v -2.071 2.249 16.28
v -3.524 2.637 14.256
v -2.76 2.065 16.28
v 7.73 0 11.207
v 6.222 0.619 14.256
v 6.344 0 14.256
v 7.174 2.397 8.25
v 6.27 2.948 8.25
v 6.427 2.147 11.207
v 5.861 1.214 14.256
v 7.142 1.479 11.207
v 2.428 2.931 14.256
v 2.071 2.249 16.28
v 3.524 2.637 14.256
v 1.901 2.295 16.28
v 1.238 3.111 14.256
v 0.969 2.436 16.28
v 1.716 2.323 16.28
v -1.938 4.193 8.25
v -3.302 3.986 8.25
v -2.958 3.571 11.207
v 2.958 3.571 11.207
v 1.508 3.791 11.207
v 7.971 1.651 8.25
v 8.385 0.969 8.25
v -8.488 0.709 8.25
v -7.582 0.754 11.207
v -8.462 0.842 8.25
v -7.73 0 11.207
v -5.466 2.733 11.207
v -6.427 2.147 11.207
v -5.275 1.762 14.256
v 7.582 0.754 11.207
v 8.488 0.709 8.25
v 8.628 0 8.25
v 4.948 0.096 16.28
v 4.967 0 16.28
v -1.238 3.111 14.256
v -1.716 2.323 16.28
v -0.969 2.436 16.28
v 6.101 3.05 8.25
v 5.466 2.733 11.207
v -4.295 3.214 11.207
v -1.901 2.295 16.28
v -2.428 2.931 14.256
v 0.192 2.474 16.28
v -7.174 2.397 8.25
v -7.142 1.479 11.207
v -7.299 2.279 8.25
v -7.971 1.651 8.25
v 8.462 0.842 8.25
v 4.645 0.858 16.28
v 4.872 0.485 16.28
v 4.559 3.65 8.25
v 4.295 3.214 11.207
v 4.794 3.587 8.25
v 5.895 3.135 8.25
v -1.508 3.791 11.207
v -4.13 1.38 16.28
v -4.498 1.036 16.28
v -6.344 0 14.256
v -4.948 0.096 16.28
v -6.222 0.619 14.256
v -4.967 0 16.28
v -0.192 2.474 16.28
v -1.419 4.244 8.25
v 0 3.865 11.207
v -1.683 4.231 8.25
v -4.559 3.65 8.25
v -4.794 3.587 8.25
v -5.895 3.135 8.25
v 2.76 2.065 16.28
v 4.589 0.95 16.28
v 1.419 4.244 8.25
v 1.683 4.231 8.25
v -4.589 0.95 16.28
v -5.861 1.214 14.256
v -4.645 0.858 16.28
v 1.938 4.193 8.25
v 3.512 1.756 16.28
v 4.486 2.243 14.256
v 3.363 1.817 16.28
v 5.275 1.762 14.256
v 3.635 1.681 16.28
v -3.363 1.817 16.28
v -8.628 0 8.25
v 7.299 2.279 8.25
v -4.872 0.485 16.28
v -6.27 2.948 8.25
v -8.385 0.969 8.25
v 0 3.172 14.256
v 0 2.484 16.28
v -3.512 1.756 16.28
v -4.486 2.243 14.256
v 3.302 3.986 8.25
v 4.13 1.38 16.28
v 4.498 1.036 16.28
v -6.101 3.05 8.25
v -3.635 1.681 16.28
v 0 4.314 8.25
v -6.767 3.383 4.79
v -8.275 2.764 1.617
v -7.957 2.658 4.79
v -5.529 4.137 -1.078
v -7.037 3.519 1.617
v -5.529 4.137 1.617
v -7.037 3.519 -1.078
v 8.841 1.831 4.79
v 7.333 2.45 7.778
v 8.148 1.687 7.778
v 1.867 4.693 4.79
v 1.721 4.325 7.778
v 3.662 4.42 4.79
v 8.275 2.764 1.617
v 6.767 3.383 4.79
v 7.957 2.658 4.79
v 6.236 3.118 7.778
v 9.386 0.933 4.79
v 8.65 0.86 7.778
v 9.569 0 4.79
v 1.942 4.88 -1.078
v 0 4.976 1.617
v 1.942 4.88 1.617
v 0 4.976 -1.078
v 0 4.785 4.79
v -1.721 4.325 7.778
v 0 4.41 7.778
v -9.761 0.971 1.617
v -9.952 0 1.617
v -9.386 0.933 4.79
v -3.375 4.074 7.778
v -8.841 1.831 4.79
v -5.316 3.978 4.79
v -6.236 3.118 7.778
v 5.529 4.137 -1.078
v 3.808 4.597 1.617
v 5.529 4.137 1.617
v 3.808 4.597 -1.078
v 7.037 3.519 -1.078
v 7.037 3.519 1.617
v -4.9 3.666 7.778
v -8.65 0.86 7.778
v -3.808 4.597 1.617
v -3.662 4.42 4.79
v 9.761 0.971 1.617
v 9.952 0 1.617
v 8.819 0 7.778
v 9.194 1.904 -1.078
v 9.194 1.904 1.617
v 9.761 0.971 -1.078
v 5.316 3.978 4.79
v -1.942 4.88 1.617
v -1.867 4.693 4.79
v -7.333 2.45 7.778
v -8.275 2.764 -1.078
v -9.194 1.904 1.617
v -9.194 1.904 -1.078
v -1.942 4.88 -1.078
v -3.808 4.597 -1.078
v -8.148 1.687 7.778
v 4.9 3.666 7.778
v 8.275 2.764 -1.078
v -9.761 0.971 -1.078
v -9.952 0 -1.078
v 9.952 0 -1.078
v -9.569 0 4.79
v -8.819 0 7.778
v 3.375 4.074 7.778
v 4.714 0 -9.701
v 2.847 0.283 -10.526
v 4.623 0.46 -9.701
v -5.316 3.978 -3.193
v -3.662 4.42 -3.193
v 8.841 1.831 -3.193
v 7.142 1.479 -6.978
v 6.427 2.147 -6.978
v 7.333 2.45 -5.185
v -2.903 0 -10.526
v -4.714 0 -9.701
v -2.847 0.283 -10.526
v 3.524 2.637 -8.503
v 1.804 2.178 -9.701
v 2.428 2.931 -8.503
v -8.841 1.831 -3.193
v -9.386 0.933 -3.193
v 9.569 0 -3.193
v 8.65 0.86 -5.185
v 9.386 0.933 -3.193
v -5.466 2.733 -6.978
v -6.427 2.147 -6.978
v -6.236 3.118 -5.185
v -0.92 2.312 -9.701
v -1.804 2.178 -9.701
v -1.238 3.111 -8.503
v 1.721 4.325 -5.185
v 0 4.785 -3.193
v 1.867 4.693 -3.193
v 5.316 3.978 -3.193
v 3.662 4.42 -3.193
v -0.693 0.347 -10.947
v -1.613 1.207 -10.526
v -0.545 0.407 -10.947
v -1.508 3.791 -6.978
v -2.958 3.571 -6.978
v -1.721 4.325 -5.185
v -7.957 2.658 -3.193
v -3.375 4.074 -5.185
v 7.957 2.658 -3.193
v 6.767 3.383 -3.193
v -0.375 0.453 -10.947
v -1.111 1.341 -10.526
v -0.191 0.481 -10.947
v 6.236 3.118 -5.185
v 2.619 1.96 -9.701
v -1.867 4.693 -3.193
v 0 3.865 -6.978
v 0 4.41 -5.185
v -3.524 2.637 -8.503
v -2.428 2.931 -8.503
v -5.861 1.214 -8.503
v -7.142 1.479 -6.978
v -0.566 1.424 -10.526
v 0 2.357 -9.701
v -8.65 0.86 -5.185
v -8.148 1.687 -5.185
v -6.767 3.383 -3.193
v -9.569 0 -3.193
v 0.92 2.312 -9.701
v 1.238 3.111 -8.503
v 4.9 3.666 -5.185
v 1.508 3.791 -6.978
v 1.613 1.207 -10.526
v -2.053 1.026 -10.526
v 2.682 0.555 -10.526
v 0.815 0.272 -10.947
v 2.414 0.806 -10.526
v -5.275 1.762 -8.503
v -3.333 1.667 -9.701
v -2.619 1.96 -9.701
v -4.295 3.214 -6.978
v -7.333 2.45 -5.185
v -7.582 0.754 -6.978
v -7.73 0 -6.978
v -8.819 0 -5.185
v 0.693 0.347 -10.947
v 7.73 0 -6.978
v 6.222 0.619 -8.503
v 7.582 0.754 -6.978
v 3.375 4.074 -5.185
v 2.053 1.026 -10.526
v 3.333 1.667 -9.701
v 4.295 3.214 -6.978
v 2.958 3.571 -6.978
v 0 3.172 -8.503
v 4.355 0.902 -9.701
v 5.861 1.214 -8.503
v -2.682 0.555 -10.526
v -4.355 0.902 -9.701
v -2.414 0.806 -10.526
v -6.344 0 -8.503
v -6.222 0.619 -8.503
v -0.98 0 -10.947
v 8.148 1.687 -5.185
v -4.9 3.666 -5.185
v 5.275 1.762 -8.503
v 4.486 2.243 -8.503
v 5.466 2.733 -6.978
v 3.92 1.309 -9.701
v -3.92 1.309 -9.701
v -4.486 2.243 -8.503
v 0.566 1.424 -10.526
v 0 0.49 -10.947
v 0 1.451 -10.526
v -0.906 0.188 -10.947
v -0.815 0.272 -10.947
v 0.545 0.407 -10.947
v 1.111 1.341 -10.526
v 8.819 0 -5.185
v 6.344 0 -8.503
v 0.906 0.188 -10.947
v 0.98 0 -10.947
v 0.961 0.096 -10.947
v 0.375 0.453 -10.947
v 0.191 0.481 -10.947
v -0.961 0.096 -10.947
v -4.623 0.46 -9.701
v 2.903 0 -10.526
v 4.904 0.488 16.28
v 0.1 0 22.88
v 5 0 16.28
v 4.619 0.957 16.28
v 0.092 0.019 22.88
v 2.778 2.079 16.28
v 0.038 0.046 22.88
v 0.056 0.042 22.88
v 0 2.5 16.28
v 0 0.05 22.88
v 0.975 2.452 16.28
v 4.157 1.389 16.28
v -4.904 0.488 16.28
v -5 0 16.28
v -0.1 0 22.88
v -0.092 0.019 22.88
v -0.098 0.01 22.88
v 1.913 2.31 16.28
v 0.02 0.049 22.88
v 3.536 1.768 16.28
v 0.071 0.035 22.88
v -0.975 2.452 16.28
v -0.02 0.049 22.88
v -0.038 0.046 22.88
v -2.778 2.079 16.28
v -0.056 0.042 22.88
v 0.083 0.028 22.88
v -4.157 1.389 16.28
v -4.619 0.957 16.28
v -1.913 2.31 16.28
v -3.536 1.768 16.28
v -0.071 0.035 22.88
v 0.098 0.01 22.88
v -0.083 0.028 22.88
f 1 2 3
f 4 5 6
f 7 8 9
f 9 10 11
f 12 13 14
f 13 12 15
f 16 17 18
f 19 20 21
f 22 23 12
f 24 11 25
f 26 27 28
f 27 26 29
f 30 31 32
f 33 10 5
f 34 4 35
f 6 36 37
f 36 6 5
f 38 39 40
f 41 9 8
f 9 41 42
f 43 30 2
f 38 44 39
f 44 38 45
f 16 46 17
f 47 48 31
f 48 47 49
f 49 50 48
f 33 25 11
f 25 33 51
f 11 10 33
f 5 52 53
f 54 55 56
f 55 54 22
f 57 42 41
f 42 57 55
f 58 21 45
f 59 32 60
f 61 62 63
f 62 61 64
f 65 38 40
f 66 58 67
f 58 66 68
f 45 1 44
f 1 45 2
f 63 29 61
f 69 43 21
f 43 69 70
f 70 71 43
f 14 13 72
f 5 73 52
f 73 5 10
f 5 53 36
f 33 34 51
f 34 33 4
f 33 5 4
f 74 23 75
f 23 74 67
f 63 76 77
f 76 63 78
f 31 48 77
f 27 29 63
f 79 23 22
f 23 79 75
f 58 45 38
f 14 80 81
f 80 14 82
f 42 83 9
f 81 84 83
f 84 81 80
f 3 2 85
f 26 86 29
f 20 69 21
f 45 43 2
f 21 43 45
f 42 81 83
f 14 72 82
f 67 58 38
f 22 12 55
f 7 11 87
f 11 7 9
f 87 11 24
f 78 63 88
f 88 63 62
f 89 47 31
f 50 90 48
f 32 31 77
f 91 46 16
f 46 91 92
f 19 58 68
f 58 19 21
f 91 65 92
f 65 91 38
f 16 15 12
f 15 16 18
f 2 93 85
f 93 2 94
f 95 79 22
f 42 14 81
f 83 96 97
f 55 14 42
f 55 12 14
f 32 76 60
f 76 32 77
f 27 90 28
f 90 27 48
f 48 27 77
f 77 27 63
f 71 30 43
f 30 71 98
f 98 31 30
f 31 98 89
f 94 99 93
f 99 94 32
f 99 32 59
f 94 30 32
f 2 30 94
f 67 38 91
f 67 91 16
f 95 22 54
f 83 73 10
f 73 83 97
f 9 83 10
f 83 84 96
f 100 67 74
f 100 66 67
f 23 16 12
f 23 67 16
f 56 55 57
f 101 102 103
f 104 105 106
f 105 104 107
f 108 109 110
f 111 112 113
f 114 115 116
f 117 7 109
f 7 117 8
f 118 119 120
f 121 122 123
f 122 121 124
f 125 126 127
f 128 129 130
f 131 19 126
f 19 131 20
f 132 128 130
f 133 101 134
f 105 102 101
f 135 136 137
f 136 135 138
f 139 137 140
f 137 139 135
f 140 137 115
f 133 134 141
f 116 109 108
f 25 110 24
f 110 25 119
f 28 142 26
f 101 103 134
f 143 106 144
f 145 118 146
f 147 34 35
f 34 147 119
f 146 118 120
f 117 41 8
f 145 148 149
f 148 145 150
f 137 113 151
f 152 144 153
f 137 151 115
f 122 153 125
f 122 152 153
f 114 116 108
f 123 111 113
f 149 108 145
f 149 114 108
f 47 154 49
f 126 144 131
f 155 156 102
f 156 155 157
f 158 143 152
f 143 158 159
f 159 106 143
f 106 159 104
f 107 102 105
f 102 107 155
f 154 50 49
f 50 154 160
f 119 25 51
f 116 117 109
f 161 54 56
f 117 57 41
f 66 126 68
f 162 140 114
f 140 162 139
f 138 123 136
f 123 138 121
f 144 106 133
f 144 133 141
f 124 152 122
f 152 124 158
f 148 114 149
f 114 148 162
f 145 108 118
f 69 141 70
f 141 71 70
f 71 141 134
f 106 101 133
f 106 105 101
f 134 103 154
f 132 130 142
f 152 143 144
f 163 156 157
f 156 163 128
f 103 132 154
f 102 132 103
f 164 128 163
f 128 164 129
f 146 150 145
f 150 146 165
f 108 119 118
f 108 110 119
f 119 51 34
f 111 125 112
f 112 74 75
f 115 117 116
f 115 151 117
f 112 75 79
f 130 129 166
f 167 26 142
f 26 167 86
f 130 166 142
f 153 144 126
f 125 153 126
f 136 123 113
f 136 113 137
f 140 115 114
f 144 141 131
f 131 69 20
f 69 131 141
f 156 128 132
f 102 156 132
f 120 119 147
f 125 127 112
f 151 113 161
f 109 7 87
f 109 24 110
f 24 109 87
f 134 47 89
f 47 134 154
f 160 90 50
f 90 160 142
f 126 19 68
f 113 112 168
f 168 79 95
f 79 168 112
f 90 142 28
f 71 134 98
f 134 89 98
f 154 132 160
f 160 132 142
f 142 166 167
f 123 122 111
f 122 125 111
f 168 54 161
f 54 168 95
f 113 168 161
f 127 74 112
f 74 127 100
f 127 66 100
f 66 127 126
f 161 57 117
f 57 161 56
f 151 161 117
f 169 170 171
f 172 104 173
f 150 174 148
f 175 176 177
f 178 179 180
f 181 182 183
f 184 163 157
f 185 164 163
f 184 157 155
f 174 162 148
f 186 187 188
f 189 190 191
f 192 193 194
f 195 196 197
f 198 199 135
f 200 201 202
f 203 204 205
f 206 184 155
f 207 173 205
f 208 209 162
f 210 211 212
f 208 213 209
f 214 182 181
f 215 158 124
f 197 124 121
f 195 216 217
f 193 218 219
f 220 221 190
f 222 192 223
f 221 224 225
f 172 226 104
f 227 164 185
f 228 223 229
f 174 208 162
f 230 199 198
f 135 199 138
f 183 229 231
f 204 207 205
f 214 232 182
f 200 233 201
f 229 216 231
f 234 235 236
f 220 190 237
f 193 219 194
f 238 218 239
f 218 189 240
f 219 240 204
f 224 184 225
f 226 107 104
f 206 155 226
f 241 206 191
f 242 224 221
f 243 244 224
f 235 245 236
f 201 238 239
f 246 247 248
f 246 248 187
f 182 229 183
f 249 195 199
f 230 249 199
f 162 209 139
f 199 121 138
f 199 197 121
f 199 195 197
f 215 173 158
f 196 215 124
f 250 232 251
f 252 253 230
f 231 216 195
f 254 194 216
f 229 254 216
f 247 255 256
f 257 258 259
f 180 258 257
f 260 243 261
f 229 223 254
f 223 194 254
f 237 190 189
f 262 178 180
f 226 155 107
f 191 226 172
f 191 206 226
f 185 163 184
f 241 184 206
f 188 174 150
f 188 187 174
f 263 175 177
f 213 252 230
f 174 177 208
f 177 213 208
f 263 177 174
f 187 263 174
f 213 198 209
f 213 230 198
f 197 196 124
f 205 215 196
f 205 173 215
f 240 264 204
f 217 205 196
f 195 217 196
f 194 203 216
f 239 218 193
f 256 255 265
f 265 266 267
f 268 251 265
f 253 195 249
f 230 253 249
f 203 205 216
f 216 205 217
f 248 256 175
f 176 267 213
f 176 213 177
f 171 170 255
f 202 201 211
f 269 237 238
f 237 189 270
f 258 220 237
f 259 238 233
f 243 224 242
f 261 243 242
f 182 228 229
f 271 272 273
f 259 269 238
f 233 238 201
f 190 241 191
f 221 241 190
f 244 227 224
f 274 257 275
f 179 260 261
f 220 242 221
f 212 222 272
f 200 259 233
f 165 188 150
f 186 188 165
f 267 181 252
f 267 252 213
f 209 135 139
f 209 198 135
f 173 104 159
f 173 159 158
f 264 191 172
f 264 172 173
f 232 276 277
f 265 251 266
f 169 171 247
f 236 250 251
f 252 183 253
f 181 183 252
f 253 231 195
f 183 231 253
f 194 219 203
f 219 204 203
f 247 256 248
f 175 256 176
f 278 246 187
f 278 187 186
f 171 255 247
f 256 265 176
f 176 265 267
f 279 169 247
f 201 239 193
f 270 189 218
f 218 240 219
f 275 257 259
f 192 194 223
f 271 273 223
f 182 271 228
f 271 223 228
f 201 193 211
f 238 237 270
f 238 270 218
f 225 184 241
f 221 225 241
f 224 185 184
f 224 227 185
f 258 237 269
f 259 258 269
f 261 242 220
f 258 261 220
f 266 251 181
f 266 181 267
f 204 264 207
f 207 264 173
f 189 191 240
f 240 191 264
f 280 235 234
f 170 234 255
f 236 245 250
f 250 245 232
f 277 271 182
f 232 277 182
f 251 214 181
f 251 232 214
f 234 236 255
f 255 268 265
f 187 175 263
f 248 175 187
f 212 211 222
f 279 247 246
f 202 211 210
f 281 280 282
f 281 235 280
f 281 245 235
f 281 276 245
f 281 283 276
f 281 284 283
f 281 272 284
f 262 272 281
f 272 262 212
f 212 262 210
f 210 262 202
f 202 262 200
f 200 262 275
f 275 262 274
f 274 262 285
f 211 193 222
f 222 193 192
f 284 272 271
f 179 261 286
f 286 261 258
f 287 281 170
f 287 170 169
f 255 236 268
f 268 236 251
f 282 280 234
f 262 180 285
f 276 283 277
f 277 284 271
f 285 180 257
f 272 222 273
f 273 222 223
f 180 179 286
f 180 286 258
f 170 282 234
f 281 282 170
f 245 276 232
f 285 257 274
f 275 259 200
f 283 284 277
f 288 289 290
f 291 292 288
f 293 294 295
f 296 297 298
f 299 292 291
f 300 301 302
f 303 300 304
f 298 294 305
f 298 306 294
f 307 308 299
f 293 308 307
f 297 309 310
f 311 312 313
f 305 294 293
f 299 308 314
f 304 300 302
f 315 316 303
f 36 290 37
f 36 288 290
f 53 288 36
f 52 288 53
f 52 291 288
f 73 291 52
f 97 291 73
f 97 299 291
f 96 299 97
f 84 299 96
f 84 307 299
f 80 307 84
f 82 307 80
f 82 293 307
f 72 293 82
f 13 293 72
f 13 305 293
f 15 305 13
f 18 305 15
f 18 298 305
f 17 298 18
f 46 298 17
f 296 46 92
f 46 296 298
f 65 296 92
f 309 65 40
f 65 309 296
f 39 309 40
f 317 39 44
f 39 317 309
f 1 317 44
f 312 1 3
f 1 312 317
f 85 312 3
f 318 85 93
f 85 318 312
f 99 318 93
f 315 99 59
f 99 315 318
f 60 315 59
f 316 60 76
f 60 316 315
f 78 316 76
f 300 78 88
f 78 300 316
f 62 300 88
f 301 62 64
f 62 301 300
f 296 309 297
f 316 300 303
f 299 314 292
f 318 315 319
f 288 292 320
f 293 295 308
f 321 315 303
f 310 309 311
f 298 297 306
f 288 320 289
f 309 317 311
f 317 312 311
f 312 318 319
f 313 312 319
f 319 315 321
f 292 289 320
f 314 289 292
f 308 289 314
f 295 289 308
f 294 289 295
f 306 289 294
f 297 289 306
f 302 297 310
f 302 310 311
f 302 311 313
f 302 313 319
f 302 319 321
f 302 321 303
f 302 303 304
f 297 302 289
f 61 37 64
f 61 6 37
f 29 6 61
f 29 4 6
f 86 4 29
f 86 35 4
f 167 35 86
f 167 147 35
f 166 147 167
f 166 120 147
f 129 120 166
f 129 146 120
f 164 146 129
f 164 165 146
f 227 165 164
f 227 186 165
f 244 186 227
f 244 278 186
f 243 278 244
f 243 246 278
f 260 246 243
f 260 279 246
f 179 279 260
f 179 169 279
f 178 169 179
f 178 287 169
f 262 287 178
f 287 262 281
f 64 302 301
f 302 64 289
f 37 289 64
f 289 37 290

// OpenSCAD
gem();

module gem() {
  intersection() {
    scale([1,0.5,1]) drop();
    translate([-1000,0,-1000]) cube([10000,10000,10000]);
  }
}

module drop() {
  r=10;
  $fn=32;

  scale([1,1,1.1]) {
    translate([0,0,r*1.48]) cylinder(r1=r/2,r2=0.1,h=6);

    translate([0,0,r/2*1.5]) scale([1,1,2]) translate([0,0,-r/2]) intersection() {
      sphere(r=r);
      translate([-r,-r,r/2]) cube([r*2,r*2,r/2]);
    }

    scale([1,1,1.5]) intersection() {
      sphere(r=r);
      translate([-r,-r,0]) cube([r*2,r*2,r/2+0.1]);
    }

    intersection() {
      sphere(r=r);
      translate([-r,-r,-r]) cube([r*2,r*2,r+0.1]);
    }
  }
}
